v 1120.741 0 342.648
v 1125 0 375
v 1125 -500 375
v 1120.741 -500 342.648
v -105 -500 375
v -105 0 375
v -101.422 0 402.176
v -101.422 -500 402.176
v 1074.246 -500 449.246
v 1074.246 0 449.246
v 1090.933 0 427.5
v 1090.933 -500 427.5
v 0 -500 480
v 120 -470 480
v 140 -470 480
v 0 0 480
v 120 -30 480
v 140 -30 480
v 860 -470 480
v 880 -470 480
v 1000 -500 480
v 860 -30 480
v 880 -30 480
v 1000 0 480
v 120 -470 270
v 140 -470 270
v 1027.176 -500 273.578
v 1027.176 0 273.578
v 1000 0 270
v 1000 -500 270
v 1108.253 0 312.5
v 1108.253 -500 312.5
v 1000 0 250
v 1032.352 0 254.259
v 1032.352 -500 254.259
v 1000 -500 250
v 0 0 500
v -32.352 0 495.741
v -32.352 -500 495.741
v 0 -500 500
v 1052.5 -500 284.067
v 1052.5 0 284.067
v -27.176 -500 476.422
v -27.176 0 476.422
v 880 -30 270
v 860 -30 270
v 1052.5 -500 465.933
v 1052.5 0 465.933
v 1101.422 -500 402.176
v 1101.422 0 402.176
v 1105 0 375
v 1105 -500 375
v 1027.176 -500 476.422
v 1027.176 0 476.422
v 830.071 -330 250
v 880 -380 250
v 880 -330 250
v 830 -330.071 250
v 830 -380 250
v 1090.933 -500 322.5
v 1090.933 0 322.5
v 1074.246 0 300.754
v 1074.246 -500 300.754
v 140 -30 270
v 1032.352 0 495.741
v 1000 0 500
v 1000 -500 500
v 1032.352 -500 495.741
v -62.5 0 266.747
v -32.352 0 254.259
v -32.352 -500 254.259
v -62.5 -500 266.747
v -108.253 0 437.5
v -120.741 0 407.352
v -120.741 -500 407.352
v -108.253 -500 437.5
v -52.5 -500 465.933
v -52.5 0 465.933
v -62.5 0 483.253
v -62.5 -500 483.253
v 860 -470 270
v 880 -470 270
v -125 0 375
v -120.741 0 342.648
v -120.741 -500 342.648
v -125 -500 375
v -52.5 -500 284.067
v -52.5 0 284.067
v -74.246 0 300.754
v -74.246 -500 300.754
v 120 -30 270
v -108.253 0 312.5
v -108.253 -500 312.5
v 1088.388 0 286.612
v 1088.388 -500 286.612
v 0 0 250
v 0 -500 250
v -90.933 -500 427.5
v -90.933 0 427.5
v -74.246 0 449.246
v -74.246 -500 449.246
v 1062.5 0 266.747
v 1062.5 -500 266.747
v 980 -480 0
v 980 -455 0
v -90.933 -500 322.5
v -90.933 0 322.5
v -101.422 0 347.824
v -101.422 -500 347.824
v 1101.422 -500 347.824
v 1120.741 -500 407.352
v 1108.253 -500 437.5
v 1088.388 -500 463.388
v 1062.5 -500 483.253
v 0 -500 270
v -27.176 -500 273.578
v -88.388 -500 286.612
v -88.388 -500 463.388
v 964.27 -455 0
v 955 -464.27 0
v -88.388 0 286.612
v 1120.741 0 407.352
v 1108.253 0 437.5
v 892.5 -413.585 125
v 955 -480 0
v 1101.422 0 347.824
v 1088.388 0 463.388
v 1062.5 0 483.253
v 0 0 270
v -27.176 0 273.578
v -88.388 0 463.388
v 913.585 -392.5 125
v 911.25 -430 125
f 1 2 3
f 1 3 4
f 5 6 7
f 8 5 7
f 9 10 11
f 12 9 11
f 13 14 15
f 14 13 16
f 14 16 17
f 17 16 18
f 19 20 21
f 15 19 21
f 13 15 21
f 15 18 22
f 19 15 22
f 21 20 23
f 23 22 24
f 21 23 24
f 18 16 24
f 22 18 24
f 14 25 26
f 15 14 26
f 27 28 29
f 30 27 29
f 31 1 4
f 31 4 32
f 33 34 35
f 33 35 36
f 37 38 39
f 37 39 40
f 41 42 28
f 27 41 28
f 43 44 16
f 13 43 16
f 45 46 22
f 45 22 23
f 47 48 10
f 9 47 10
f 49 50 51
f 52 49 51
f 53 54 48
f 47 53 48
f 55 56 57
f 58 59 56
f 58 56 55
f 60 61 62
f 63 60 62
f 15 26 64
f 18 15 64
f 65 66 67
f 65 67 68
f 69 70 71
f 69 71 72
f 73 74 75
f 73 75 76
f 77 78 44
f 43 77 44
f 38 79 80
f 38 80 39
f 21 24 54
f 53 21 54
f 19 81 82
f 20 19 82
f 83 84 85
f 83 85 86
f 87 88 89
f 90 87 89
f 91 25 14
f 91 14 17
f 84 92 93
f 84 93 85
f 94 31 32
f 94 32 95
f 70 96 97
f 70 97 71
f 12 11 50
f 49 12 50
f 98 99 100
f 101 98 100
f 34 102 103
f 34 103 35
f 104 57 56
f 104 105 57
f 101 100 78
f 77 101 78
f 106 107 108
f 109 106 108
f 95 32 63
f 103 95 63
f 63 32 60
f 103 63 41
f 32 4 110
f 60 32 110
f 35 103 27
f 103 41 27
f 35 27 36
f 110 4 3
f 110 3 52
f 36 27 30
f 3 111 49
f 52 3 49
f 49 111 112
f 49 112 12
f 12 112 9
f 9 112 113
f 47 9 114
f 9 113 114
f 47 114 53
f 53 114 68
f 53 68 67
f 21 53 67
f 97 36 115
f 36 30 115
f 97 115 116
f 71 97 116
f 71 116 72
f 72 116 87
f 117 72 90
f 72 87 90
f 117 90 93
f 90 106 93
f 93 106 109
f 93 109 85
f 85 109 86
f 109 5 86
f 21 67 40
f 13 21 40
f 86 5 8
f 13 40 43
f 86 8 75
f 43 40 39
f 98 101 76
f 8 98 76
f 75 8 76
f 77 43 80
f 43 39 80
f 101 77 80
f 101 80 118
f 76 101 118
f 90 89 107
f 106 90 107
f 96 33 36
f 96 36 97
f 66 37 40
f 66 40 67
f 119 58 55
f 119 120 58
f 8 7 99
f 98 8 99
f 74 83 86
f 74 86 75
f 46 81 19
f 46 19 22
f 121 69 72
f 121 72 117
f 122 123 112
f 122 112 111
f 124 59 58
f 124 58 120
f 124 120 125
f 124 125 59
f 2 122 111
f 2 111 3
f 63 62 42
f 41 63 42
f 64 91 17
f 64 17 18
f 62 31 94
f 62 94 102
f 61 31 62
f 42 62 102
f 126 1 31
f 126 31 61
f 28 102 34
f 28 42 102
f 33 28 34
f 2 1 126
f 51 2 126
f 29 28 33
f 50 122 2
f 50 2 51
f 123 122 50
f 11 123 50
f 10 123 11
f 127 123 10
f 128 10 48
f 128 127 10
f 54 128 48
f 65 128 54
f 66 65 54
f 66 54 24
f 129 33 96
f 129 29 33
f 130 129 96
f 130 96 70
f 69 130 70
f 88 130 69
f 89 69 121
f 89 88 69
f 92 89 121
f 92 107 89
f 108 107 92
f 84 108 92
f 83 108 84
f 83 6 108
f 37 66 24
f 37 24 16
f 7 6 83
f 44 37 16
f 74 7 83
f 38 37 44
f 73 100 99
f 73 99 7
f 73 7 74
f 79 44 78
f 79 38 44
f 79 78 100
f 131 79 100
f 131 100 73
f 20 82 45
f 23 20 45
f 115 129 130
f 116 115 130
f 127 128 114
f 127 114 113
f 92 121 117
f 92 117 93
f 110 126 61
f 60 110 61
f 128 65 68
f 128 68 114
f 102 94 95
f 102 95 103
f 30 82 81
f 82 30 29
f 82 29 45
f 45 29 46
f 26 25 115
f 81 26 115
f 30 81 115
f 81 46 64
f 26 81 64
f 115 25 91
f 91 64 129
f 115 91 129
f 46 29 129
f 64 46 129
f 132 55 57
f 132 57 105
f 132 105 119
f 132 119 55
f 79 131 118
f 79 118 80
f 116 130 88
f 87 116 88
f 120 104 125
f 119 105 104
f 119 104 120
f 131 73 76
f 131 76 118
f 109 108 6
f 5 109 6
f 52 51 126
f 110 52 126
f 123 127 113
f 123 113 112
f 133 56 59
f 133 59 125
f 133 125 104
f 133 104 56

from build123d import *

# Parameters (mm, degrees)
PAD_DEPTH    = 500
SKETCH003_W  = 20
SKETCH003_H  = 440
PAD001_DEPTH = 210


with BuildPart() as top:
    # Sketch → Pad (new body)
    with BuildSketch(Plane.XZ):
        Polygon((0, 500), (1000, 500), (1032.352381, 495.740728), (1062.5, 483.253175), (1088.388348, 463.388348), (1108.253175, 437.5), (1120.740728, 407.352381), (1125, 375), (1120.740728, 342.647619), (1108.253175, 312.5), (1088.388348, 286.611652), (1062.5, 266.746825), (1032.352381, 254.259272), (1000, 250), (0, 250), (-32.352381, 254.259272), (-62.5, 266.746825), (-88.388348, 286.611652), (-108.253175, 312.5), (-120.740728, 342.647619), (-125, 375), (-120.740728, 407.352381), (-108.253175, 437.5), (-88.388348, 463.388348), (-62.5, 483.253175), (-32.352381, 495.740728), align=None)
        Polygon((0, 480), (1000, 480), (1027.176, 476.422212), (1052.5, 465.932667), (1074.246212, 449.246212), (1090.932667, 427.5), (1101.422212, 402.176), (1105, 375), (1101.422212, 347.824), (1090.932667, 322.5), (1074.246212, 300.753788), (1052.5, 284.067333), (1027.176, 273.577788), (1000, 270), (0, 270), (-27.176, 273.577788), (-52.5, 284.067333), (-74.246212, 300.753788), (-90.932667, 322.5), (-101.422212, 347.824), (-105, 375), (-101.422212, 402.176), (-90.932667, 427.5), (-74.246212, 449.246212), (-52.5, 465.932667), (-27.176, 476.422212), align=None, mode=Mode.SUBTRACT)
    extrude(amount=PAD_DEPTH)

    # Sketch003 (on DatumPlane) → Pad001 (join)
    with BuildSketch(Plane.XY.offset(270)):
        with Locations((130, -250)):
            Rectangle(SKETCH003_W, SKETCH003_H)
        with Locations((870, -250)):
            Rectangle(SKETCH003_W, SKETCH003_H)
    extrude(amount=PAD001_DEPTH)


with BuildPart() as leg:
    # Sketch001 (on DatumPlane) → AdditiveLoft section 0
    with BuildSketch(Plane.XY.offset(250)):
        Polygon((120, -380), (170, -380), (170, -330.070711), (169.929289, -330), (120, -330), align=None)
    # Sketch002 → AdditiveLoft section 1
    with BuildSketch(Plane.XY):
        Polygon((20, -455), (20, -480), (45, -480), (45, -464.270267), (35.729733, -455), align=None)
    loft()


with BuildPart() as leg2:
    # Part__Mirroring: instance of Leg
    add(leg.part.mirror(Plane(origin=(0, -250, 0), x_dir=(-1, 0, 0), z_dir=(0, -1, 0))))


with BuildPart() as leg3:
    # Part__Mirroring001: instance of Leg2
    add(leg2.part.mirror(Plane(origin=(500, 0, 0), x_dir=(0, -1, 0), z_dir=(1, 0, 0))))


with BuildPart() as leg4:
    # Part__Mirroring002: instance of Leg3
    add(leg3.part.mirror(Plane(origin=(0, -250, 0), x_dir=(-1, 0, 0), z_dir=(0, -1, 0))))


solid = Compound([top.part, leg4.part])
